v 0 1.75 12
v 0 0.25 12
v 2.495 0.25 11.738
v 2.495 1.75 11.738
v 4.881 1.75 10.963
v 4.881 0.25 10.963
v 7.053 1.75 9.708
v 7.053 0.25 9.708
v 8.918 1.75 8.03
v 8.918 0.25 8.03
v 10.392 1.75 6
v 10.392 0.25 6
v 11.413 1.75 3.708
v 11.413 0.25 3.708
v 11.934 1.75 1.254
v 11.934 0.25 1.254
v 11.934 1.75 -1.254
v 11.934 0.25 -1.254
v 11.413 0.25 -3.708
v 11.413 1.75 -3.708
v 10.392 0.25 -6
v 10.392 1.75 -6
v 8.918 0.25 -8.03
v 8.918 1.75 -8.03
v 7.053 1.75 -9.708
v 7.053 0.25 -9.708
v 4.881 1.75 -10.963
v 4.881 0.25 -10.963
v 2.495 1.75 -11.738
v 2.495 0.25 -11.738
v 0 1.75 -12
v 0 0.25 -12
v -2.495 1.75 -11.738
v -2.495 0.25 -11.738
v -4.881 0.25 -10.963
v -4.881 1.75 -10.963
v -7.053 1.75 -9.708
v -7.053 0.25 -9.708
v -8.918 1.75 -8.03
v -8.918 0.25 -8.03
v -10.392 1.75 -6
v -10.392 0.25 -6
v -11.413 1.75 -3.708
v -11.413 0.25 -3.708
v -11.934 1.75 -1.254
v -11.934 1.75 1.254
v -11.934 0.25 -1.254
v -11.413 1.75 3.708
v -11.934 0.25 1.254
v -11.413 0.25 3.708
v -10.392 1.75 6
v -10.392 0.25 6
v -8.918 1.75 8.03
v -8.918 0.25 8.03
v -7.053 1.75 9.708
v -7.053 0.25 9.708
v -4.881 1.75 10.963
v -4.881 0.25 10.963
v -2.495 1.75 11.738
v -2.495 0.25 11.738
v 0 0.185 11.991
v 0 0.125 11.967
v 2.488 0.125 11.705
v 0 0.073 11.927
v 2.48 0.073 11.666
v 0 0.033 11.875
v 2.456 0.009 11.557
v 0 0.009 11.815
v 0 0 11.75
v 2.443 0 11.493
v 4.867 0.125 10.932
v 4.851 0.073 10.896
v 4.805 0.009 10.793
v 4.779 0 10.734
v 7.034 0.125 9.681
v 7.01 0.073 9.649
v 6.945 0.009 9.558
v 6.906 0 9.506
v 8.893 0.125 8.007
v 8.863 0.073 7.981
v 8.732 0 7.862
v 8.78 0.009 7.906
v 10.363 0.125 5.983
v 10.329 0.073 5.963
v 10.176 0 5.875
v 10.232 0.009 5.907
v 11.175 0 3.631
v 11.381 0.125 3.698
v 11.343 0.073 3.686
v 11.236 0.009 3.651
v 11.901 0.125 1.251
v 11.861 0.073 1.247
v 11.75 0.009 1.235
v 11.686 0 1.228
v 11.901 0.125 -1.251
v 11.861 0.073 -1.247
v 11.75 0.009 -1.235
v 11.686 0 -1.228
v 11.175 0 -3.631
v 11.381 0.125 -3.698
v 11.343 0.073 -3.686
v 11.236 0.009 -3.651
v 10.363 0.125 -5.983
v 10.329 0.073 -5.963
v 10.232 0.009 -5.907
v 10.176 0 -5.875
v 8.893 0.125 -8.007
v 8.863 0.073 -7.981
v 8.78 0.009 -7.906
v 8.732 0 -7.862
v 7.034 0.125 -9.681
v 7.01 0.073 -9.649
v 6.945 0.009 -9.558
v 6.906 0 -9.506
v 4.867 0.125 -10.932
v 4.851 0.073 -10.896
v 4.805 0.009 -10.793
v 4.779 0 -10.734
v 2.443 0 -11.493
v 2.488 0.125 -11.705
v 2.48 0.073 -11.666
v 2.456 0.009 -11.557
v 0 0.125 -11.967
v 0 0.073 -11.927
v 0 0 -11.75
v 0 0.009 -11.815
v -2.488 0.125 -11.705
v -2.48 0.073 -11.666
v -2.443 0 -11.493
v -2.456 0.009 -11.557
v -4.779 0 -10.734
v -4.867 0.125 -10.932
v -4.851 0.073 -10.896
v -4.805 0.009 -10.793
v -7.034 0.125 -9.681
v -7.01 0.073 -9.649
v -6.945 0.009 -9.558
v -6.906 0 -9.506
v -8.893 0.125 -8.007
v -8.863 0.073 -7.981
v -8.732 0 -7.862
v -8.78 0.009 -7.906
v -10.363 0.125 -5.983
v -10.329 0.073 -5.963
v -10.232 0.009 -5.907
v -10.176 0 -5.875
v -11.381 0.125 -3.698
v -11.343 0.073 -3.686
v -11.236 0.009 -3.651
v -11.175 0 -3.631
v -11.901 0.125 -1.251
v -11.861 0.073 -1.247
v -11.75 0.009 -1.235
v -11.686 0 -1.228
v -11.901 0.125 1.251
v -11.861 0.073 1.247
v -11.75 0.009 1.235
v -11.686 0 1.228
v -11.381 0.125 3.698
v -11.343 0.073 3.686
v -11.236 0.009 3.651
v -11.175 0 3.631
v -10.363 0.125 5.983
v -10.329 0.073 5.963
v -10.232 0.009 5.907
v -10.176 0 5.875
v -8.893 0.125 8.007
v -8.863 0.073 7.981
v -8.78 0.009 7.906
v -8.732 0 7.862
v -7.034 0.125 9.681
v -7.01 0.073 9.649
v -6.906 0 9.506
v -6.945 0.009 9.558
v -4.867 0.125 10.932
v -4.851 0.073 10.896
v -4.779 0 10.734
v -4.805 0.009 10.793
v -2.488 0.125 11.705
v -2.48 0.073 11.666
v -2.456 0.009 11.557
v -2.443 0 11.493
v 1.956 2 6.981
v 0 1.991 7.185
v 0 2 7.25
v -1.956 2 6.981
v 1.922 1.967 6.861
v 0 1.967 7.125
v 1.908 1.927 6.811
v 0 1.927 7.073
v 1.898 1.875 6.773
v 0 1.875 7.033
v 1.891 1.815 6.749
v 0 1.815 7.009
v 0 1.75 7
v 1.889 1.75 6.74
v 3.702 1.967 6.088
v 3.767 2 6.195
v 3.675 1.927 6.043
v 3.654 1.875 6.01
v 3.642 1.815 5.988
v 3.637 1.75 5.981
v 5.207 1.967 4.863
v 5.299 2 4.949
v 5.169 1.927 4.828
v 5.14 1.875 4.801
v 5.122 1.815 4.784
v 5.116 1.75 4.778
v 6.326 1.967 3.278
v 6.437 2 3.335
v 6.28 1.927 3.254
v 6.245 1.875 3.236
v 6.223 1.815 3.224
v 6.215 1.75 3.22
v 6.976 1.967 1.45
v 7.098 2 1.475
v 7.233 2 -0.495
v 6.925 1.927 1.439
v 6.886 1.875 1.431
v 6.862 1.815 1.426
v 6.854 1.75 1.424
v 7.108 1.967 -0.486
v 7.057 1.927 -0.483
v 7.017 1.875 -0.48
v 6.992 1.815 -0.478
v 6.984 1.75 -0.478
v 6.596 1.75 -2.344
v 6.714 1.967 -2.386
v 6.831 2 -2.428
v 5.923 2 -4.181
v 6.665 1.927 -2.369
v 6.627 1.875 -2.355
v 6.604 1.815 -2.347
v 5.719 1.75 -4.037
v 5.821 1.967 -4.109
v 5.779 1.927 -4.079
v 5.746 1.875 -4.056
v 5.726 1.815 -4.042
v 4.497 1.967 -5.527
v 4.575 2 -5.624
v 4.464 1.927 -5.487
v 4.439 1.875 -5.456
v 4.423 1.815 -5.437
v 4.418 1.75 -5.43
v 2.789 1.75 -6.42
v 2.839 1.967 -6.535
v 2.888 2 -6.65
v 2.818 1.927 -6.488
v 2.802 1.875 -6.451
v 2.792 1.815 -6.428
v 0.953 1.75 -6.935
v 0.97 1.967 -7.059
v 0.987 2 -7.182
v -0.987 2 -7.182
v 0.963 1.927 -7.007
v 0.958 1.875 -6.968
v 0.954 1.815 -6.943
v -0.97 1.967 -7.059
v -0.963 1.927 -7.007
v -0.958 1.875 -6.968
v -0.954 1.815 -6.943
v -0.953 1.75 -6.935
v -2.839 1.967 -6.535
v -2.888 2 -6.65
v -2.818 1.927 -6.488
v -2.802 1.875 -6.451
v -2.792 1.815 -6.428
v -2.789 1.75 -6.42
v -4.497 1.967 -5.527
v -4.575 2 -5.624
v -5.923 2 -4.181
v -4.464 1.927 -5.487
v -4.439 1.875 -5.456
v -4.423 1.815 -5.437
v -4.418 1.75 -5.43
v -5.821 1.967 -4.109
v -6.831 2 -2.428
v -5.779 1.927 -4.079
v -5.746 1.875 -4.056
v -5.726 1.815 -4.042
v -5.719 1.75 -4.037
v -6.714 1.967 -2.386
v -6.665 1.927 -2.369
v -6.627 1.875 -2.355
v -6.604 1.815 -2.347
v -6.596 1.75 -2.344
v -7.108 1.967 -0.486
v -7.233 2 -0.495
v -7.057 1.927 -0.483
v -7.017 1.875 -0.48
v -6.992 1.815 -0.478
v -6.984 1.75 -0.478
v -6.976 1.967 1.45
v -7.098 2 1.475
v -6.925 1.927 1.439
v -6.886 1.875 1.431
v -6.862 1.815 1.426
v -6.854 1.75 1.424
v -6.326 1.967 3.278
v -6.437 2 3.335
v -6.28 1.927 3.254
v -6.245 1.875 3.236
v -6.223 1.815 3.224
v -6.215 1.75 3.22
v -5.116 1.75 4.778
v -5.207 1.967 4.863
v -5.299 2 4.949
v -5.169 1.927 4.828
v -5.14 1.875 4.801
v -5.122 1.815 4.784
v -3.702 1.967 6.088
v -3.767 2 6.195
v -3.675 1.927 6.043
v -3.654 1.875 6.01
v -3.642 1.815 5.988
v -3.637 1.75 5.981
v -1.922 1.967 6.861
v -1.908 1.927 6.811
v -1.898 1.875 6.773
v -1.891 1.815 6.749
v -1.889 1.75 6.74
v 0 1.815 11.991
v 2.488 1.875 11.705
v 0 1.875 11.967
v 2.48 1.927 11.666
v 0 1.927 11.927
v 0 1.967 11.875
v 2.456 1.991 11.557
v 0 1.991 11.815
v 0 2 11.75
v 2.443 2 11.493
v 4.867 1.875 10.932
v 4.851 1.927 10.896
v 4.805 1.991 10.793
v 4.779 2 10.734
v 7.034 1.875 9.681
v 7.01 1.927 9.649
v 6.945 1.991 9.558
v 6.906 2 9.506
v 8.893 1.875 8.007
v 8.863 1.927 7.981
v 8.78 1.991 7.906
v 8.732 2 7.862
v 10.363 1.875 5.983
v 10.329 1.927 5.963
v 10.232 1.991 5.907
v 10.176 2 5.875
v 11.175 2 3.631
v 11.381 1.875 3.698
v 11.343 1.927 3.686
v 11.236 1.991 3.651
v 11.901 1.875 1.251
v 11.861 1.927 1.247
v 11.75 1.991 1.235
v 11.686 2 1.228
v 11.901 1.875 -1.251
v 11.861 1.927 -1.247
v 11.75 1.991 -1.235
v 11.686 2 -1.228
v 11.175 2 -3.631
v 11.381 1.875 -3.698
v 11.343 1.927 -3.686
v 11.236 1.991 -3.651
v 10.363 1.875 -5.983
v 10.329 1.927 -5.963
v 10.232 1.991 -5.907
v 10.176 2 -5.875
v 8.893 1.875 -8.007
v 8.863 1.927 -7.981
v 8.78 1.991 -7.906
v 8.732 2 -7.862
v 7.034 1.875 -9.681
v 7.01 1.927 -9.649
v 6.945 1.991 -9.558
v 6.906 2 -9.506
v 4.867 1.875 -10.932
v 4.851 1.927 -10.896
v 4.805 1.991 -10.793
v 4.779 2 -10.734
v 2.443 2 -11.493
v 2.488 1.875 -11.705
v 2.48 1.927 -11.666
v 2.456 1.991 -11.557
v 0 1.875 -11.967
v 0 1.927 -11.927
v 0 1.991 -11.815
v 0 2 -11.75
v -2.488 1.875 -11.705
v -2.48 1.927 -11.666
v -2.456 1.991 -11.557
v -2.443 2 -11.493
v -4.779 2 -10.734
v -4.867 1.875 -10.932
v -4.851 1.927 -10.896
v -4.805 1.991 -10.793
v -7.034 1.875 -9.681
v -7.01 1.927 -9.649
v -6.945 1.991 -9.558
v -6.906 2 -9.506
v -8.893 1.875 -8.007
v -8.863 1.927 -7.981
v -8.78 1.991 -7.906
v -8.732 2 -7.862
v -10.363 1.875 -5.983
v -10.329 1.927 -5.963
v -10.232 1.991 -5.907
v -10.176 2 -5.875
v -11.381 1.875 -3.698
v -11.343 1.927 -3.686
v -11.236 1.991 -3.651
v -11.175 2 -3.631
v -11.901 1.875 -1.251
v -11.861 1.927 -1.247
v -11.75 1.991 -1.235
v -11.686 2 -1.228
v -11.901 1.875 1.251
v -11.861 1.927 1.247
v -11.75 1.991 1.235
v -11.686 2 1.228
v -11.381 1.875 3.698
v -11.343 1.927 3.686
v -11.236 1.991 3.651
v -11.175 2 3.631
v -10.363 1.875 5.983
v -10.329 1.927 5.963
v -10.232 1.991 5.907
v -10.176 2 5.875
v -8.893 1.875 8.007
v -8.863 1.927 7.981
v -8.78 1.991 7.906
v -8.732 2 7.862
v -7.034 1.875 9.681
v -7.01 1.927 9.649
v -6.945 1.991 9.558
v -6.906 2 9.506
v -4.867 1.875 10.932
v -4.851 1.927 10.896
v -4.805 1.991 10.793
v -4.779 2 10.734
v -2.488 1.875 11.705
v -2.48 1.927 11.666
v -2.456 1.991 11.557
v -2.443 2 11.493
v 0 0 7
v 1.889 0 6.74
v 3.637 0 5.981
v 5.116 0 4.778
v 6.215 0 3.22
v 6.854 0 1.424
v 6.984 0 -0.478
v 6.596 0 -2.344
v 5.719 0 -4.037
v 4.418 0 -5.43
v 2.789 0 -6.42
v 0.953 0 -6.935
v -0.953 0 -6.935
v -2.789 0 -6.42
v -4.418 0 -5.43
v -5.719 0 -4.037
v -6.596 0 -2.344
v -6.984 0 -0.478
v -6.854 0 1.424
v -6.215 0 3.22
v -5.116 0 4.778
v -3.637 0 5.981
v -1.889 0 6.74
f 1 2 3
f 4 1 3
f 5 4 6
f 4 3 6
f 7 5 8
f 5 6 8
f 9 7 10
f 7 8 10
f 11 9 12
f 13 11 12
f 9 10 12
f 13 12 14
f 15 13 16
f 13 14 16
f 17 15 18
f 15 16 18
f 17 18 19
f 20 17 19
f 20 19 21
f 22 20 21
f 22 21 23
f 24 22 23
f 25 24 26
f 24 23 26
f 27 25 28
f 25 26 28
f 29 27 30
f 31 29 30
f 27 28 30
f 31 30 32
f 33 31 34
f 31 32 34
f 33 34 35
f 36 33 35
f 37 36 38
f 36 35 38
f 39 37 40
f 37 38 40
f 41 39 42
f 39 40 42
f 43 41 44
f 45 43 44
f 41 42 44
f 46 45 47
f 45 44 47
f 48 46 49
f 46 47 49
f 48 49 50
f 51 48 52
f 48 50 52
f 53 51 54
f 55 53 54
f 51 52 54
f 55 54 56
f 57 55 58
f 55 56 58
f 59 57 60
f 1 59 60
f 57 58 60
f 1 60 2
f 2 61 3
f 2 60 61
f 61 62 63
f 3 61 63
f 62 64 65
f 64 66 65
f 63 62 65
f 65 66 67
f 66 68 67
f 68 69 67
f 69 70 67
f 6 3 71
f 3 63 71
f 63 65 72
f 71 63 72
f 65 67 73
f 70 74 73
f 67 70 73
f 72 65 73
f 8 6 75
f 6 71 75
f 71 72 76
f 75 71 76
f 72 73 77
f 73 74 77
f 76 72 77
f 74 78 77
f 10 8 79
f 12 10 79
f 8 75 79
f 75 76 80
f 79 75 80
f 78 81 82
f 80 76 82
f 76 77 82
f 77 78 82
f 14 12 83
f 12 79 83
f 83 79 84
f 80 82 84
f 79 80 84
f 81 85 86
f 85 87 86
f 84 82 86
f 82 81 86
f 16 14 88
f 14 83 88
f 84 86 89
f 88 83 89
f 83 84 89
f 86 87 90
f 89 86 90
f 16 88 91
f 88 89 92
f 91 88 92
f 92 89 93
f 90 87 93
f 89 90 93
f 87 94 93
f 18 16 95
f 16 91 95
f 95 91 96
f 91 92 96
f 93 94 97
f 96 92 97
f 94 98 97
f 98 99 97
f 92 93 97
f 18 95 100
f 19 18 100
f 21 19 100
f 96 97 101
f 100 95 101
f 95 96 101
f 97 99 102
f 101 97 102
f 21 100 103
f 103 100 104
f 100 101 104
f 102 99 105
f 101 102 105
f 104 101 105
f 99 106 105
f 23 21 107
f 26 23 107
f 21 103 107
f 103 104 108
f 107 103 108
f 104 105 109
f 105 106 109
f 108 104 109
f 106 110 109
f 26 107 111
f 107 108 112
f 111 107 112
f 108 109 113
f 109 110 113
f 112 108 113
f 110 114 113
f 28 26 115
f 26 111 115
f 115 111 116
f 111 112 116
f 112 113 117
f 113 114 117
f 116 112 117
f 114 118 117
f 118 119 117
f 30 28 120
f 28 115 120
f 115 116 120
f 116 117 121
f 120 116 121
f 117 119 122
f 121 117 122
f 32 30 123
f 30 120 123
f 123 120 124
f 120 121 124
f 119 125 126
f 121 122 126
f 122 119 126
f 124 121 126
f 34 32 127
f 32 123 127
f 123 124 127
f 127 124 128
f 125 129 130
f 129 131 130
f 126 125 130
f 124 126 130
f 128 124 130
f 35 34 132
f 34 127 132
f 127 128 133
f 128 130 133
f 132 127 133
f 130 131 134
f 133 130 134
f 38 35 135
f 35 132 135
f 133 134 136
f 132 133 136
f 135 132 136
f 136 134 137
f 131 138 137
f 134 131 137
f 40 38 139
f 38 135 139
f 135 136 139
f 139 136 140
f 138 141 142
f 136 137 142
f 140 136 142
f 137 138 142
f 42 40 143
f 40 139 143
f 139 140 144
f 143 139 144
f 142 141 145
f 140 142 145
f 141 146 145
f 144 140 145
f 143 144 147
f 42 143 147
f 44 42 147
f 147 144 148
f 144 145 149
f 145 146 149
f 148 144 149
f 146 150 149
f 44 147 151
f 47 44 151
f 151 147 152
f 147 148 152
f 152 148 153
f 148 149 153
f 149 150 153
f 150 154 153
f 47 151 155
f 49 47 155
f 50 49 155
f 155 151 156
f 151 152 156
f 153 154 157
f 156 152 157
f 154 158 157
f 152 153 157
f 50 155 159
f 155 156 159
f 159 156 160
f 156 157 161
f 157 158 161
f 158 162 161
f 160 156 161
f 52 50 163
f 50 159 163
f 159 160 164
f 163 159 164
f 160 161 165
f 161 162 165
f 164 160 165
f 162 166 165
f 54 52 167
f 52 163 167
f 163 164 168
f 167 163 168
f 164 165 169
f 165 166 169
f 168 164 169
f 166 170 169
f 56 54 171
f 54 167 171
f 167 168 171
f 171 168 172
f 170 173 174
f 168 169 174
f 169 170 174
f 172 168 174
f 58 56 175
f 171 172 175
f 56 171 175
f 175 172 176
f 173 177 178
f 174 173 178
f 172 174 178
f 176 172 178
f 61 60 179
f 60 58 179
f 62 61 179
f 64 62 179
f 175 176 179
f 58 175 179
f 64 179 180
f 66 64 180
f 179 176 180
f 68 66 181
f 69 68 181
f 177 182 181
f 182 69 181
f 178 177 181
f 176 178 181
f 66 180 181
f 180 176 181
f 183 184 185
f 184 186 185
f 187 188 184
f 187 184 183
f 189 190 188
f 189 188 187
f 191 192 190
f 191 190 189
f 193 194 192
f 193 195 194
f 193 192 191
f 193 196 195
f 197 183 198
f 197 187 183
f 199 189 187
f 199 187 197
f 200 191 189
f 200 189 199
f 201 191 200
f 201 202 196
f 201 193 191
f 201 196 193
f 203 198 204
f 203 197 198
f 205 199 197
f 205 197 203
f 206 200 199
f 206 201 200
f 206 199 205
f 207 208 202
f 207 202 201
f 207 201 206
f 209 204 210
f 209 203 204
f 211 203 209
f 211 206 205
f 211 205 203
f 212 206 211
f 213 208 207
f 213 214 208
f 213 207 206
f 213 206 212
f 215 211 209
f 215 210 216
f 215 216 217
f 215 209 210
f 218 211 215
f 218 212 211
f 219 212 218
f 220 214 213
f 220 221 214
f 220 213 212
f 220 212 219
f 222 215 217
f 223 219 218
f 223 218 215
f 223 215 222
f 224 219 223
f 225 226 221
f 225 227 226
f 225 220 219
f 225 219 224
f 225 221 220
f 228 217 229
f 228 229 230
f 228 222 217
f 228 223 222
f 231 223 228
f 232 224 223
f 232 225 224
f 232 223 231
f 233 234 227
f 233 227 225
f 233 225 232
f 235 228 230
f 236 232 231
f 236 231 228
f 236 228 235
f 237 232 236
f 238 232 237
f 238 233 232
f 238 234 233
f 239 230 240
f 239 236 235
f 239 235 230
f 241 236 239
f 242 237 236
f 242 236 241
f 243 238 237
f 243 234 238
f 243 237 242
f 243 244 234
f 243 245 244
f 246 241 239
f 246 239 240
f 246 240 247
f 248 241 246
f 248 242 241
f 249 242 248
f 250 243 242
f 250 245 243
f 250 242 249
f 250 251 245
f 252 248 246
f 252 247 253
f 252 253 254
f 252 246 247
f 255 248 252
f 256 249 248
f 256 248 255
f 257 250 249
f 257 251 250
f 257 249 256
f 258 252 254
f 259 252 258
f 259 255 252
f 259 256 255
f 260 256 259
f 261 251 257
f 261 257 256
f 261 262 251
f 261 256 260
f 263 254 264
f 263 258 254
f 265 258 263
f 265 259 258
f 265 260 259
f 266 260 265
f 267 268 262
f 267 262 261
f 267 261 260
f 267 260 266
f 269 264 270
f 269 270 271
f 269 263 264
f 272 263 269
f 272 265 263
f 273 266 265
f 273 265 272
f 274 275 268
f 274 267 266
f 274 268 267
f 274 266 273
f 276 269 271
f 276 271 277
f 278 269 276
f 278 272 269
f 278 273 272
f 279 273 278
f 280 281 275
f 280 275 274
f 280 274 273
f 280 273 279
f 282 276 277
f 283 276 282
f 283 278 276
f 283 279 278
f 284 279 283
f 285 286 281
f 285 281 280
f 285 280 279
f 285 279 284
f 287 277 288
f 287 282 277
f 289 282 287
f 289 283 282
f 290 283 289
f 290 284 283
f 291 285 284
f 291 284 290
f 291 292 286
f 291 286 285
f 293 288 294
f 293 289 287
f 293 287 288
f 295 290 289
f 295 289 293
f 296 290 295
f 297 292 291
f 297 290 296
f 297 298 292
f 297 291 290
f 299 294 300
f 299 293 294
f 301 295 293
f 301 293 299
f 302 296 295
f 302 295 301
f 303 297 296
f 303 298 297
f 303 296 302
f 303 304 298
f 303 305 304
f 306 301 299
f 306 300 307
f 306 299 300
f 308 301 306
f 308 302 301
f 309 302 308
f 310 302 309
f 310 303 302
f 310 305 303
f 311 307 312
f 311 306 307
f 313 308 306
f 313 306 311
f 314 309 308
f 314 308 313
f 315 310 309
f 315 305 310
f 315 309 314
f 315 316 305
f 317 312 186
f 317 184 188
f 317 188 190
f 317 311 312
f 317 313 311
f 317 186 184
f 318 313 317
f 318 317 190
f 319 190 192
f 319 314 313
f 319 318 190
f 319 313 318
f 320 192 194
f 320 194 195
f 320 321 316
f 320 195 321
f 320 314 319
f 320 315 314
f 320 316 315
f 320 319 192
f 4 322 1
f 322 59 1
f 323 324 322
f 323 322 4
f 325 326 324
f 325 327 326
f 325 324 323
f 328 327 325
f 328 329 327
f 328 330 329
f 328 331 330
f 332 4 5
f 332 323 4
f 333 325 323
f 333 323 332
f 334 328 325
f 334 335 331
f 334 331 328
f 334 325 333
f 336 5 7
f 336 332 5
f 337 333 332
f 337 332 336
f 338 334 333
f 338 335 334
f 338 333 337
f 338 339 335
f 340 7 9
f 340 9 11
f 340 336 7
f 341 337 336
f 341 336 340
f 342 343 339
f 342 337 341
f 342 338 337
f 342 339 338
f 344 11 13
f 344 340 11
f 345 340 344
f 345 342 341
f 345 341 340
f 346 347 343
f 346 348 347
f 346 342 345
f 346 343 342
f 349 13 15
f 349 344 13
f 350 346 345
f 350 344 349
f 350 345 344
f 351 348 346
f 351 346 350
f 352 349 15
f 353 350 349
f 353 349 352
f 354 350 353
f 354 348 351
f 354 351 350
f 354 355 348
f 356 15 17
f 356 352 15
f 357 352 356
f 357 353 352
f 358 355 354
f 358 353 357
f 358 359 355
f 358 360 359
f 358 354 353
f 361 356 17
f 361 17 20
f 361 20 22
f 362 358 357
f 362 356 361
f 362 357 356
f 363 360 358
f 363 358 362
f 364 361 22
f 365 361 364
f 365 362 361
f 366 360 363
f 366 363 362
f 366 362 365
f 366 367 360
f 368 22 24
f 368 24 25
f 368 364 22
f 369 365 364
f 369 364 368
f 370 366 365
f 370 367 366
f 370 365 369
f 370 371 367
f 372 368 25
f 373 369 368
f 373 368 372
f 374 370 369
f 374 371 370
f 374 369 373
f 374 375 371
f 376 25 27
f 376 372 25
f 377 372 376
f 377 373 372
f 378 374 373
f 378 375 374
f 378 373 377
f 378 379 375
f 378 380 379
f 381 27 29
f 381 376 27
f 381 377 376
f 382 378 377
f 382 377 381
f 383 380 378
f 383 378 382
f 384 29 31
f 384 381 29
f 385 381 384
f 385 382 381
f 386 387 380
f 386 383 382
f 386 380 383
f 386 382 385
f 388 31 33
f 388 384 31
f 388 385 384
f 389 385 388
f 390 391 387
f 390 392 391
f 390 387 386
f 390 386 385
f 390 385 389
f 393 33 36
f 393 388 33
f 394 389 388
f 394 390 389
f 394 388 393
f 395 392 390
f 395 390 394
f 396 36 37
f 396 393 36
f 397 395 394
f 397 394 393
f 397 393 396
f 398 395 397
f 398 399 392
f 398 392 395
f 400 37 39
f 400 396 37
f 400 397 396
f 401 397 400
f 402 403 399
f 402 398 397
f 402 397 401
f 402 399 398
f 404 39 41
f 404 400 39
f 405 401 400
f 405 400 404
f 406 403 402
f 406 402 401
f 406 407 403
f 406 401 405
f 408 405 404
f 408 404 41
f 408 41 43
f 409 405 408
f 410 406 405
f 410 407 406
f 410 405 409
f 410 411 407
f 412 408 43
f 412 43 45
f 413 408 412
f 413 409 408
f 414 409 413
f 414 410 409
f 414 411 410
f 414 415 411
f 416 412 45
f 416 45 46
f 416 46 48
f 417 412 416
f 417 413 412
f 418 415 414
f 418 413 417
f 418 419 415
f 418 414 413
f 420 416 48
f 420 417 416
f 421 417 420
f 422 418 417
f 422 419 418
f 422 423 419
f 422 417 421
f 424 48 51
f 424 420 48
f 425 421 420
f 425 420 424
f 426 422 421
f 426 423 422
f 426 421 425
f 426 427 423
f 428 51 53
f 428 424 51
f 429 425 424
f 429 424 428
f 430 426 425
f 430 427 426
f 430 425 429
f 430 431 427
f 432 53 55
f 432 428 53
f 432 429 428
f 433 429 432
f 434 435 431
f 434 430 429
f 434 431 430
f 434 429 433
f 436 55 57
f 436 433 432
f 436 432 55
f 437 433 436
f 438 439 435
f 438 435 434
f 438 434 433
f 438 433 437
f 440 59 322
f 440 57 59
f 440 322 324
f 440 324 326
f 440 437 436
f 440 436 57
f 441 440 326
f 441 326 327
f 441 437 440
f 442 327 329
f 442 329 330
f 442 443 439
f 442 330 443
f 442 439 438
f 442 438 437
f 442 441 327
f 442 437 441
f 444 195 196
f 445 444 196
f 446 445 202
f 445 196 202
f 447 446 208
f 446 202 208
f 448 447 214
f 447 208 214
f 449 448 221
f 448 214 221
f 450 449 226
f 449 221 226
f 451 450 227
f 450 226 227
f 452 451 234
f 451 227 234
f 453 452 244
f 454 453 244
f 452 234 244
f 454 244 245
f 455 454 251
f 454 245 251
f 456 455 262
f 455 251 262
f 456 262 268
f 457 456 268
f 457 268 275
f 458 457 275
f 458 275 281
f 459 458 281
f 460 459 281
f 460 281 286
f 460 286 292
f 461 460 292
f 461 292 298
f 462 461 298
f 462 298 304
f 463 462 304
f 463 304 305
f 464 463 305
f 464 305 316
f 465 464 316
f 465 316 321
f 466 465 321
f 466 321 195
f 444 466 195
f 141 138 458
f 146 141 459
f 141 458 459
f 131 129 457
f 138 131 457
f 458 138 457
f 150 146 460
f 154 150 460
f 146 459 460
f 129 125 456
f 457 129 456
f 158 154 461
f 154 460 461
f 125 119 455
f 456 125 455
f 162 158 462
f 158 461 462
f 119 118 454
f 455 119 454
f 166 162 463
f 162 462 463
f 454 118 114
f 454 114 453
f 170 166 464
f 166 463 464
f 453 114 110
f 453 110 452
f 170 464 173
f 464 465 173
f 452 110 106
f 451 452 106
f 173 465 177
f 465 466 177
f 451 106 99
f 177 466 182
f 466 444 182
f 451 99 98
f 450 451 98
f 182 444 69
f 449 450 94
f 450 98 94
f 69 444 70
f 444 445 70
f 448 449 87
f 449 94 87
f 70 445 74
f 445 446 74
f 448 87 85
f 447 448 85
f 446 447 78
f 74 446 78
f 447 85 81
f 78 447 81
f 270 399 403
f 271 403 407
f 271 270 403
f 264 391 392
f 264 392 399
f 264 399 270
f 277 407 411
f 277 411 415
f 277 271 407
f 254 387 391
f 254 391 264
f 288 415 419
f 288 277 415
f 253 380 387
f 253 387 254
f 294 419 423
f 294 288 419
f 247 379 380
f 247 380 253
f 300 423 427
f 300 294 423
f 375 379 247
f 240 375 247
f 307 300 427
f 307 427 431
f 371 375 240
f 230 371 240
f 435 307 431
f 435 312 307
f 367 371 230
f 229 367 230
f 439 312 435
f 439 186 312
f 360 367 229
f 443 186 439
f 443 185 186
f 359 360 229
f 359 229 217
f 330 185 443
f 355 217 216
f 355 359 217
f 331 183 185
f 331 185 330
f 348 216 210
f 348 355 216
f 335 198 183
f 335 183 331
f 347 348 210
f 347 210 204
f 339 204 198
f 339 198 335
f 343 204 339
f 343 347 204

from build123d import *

# Parameters (mm, degrees)
SKETCH1_R           = 12
BOSS_EXTRUDE1_DEPTH = 2
SKETCH2_R           = 7
CUT_EXTRUDE1_DEPTH  = 18.088007491
FILLET1_R           = 0.25


with BuildPart() as part:
    # Sketch1 → Boss-Extrude1 (new body)
    with BuildSketch(Plane(origin=(0, 0, 0), x_dir=(1, 0, 0), z_dir=(0, 1, 0))):
        with Locations(Location((0, 0, 0), (0, 0, 270))):
            Circle(SKETCH1_R)
    extrude(amount=BOSS_EXTRUDE1_DEPTH)

    # Sketch2 → Cut-Extrude1 (cut, through all)
    with BuildSketch(Plane(origin=(0, 2, 0), x_dir=(1, 0, 0), z_dir=(0, 1, 0))):
        with Locations(Location((0, 0, 0), (0, 0, 270))):
            Circle(SKETCH2_R)
    extrude(amount=-CUT_EXTRUDE1_DEPTH, mode=Mode.SUBTRACT)

    # Fillet1
    fillet1_edges = [part.edges().sort_by_distance(p)[0] for p in [
        (0, 0, -12),
        (0, 2, -12),
        (0, 2, -7),
    ]]
    fillet(fillet1_edges, radius=FILLET1_R)


solid = part.part
